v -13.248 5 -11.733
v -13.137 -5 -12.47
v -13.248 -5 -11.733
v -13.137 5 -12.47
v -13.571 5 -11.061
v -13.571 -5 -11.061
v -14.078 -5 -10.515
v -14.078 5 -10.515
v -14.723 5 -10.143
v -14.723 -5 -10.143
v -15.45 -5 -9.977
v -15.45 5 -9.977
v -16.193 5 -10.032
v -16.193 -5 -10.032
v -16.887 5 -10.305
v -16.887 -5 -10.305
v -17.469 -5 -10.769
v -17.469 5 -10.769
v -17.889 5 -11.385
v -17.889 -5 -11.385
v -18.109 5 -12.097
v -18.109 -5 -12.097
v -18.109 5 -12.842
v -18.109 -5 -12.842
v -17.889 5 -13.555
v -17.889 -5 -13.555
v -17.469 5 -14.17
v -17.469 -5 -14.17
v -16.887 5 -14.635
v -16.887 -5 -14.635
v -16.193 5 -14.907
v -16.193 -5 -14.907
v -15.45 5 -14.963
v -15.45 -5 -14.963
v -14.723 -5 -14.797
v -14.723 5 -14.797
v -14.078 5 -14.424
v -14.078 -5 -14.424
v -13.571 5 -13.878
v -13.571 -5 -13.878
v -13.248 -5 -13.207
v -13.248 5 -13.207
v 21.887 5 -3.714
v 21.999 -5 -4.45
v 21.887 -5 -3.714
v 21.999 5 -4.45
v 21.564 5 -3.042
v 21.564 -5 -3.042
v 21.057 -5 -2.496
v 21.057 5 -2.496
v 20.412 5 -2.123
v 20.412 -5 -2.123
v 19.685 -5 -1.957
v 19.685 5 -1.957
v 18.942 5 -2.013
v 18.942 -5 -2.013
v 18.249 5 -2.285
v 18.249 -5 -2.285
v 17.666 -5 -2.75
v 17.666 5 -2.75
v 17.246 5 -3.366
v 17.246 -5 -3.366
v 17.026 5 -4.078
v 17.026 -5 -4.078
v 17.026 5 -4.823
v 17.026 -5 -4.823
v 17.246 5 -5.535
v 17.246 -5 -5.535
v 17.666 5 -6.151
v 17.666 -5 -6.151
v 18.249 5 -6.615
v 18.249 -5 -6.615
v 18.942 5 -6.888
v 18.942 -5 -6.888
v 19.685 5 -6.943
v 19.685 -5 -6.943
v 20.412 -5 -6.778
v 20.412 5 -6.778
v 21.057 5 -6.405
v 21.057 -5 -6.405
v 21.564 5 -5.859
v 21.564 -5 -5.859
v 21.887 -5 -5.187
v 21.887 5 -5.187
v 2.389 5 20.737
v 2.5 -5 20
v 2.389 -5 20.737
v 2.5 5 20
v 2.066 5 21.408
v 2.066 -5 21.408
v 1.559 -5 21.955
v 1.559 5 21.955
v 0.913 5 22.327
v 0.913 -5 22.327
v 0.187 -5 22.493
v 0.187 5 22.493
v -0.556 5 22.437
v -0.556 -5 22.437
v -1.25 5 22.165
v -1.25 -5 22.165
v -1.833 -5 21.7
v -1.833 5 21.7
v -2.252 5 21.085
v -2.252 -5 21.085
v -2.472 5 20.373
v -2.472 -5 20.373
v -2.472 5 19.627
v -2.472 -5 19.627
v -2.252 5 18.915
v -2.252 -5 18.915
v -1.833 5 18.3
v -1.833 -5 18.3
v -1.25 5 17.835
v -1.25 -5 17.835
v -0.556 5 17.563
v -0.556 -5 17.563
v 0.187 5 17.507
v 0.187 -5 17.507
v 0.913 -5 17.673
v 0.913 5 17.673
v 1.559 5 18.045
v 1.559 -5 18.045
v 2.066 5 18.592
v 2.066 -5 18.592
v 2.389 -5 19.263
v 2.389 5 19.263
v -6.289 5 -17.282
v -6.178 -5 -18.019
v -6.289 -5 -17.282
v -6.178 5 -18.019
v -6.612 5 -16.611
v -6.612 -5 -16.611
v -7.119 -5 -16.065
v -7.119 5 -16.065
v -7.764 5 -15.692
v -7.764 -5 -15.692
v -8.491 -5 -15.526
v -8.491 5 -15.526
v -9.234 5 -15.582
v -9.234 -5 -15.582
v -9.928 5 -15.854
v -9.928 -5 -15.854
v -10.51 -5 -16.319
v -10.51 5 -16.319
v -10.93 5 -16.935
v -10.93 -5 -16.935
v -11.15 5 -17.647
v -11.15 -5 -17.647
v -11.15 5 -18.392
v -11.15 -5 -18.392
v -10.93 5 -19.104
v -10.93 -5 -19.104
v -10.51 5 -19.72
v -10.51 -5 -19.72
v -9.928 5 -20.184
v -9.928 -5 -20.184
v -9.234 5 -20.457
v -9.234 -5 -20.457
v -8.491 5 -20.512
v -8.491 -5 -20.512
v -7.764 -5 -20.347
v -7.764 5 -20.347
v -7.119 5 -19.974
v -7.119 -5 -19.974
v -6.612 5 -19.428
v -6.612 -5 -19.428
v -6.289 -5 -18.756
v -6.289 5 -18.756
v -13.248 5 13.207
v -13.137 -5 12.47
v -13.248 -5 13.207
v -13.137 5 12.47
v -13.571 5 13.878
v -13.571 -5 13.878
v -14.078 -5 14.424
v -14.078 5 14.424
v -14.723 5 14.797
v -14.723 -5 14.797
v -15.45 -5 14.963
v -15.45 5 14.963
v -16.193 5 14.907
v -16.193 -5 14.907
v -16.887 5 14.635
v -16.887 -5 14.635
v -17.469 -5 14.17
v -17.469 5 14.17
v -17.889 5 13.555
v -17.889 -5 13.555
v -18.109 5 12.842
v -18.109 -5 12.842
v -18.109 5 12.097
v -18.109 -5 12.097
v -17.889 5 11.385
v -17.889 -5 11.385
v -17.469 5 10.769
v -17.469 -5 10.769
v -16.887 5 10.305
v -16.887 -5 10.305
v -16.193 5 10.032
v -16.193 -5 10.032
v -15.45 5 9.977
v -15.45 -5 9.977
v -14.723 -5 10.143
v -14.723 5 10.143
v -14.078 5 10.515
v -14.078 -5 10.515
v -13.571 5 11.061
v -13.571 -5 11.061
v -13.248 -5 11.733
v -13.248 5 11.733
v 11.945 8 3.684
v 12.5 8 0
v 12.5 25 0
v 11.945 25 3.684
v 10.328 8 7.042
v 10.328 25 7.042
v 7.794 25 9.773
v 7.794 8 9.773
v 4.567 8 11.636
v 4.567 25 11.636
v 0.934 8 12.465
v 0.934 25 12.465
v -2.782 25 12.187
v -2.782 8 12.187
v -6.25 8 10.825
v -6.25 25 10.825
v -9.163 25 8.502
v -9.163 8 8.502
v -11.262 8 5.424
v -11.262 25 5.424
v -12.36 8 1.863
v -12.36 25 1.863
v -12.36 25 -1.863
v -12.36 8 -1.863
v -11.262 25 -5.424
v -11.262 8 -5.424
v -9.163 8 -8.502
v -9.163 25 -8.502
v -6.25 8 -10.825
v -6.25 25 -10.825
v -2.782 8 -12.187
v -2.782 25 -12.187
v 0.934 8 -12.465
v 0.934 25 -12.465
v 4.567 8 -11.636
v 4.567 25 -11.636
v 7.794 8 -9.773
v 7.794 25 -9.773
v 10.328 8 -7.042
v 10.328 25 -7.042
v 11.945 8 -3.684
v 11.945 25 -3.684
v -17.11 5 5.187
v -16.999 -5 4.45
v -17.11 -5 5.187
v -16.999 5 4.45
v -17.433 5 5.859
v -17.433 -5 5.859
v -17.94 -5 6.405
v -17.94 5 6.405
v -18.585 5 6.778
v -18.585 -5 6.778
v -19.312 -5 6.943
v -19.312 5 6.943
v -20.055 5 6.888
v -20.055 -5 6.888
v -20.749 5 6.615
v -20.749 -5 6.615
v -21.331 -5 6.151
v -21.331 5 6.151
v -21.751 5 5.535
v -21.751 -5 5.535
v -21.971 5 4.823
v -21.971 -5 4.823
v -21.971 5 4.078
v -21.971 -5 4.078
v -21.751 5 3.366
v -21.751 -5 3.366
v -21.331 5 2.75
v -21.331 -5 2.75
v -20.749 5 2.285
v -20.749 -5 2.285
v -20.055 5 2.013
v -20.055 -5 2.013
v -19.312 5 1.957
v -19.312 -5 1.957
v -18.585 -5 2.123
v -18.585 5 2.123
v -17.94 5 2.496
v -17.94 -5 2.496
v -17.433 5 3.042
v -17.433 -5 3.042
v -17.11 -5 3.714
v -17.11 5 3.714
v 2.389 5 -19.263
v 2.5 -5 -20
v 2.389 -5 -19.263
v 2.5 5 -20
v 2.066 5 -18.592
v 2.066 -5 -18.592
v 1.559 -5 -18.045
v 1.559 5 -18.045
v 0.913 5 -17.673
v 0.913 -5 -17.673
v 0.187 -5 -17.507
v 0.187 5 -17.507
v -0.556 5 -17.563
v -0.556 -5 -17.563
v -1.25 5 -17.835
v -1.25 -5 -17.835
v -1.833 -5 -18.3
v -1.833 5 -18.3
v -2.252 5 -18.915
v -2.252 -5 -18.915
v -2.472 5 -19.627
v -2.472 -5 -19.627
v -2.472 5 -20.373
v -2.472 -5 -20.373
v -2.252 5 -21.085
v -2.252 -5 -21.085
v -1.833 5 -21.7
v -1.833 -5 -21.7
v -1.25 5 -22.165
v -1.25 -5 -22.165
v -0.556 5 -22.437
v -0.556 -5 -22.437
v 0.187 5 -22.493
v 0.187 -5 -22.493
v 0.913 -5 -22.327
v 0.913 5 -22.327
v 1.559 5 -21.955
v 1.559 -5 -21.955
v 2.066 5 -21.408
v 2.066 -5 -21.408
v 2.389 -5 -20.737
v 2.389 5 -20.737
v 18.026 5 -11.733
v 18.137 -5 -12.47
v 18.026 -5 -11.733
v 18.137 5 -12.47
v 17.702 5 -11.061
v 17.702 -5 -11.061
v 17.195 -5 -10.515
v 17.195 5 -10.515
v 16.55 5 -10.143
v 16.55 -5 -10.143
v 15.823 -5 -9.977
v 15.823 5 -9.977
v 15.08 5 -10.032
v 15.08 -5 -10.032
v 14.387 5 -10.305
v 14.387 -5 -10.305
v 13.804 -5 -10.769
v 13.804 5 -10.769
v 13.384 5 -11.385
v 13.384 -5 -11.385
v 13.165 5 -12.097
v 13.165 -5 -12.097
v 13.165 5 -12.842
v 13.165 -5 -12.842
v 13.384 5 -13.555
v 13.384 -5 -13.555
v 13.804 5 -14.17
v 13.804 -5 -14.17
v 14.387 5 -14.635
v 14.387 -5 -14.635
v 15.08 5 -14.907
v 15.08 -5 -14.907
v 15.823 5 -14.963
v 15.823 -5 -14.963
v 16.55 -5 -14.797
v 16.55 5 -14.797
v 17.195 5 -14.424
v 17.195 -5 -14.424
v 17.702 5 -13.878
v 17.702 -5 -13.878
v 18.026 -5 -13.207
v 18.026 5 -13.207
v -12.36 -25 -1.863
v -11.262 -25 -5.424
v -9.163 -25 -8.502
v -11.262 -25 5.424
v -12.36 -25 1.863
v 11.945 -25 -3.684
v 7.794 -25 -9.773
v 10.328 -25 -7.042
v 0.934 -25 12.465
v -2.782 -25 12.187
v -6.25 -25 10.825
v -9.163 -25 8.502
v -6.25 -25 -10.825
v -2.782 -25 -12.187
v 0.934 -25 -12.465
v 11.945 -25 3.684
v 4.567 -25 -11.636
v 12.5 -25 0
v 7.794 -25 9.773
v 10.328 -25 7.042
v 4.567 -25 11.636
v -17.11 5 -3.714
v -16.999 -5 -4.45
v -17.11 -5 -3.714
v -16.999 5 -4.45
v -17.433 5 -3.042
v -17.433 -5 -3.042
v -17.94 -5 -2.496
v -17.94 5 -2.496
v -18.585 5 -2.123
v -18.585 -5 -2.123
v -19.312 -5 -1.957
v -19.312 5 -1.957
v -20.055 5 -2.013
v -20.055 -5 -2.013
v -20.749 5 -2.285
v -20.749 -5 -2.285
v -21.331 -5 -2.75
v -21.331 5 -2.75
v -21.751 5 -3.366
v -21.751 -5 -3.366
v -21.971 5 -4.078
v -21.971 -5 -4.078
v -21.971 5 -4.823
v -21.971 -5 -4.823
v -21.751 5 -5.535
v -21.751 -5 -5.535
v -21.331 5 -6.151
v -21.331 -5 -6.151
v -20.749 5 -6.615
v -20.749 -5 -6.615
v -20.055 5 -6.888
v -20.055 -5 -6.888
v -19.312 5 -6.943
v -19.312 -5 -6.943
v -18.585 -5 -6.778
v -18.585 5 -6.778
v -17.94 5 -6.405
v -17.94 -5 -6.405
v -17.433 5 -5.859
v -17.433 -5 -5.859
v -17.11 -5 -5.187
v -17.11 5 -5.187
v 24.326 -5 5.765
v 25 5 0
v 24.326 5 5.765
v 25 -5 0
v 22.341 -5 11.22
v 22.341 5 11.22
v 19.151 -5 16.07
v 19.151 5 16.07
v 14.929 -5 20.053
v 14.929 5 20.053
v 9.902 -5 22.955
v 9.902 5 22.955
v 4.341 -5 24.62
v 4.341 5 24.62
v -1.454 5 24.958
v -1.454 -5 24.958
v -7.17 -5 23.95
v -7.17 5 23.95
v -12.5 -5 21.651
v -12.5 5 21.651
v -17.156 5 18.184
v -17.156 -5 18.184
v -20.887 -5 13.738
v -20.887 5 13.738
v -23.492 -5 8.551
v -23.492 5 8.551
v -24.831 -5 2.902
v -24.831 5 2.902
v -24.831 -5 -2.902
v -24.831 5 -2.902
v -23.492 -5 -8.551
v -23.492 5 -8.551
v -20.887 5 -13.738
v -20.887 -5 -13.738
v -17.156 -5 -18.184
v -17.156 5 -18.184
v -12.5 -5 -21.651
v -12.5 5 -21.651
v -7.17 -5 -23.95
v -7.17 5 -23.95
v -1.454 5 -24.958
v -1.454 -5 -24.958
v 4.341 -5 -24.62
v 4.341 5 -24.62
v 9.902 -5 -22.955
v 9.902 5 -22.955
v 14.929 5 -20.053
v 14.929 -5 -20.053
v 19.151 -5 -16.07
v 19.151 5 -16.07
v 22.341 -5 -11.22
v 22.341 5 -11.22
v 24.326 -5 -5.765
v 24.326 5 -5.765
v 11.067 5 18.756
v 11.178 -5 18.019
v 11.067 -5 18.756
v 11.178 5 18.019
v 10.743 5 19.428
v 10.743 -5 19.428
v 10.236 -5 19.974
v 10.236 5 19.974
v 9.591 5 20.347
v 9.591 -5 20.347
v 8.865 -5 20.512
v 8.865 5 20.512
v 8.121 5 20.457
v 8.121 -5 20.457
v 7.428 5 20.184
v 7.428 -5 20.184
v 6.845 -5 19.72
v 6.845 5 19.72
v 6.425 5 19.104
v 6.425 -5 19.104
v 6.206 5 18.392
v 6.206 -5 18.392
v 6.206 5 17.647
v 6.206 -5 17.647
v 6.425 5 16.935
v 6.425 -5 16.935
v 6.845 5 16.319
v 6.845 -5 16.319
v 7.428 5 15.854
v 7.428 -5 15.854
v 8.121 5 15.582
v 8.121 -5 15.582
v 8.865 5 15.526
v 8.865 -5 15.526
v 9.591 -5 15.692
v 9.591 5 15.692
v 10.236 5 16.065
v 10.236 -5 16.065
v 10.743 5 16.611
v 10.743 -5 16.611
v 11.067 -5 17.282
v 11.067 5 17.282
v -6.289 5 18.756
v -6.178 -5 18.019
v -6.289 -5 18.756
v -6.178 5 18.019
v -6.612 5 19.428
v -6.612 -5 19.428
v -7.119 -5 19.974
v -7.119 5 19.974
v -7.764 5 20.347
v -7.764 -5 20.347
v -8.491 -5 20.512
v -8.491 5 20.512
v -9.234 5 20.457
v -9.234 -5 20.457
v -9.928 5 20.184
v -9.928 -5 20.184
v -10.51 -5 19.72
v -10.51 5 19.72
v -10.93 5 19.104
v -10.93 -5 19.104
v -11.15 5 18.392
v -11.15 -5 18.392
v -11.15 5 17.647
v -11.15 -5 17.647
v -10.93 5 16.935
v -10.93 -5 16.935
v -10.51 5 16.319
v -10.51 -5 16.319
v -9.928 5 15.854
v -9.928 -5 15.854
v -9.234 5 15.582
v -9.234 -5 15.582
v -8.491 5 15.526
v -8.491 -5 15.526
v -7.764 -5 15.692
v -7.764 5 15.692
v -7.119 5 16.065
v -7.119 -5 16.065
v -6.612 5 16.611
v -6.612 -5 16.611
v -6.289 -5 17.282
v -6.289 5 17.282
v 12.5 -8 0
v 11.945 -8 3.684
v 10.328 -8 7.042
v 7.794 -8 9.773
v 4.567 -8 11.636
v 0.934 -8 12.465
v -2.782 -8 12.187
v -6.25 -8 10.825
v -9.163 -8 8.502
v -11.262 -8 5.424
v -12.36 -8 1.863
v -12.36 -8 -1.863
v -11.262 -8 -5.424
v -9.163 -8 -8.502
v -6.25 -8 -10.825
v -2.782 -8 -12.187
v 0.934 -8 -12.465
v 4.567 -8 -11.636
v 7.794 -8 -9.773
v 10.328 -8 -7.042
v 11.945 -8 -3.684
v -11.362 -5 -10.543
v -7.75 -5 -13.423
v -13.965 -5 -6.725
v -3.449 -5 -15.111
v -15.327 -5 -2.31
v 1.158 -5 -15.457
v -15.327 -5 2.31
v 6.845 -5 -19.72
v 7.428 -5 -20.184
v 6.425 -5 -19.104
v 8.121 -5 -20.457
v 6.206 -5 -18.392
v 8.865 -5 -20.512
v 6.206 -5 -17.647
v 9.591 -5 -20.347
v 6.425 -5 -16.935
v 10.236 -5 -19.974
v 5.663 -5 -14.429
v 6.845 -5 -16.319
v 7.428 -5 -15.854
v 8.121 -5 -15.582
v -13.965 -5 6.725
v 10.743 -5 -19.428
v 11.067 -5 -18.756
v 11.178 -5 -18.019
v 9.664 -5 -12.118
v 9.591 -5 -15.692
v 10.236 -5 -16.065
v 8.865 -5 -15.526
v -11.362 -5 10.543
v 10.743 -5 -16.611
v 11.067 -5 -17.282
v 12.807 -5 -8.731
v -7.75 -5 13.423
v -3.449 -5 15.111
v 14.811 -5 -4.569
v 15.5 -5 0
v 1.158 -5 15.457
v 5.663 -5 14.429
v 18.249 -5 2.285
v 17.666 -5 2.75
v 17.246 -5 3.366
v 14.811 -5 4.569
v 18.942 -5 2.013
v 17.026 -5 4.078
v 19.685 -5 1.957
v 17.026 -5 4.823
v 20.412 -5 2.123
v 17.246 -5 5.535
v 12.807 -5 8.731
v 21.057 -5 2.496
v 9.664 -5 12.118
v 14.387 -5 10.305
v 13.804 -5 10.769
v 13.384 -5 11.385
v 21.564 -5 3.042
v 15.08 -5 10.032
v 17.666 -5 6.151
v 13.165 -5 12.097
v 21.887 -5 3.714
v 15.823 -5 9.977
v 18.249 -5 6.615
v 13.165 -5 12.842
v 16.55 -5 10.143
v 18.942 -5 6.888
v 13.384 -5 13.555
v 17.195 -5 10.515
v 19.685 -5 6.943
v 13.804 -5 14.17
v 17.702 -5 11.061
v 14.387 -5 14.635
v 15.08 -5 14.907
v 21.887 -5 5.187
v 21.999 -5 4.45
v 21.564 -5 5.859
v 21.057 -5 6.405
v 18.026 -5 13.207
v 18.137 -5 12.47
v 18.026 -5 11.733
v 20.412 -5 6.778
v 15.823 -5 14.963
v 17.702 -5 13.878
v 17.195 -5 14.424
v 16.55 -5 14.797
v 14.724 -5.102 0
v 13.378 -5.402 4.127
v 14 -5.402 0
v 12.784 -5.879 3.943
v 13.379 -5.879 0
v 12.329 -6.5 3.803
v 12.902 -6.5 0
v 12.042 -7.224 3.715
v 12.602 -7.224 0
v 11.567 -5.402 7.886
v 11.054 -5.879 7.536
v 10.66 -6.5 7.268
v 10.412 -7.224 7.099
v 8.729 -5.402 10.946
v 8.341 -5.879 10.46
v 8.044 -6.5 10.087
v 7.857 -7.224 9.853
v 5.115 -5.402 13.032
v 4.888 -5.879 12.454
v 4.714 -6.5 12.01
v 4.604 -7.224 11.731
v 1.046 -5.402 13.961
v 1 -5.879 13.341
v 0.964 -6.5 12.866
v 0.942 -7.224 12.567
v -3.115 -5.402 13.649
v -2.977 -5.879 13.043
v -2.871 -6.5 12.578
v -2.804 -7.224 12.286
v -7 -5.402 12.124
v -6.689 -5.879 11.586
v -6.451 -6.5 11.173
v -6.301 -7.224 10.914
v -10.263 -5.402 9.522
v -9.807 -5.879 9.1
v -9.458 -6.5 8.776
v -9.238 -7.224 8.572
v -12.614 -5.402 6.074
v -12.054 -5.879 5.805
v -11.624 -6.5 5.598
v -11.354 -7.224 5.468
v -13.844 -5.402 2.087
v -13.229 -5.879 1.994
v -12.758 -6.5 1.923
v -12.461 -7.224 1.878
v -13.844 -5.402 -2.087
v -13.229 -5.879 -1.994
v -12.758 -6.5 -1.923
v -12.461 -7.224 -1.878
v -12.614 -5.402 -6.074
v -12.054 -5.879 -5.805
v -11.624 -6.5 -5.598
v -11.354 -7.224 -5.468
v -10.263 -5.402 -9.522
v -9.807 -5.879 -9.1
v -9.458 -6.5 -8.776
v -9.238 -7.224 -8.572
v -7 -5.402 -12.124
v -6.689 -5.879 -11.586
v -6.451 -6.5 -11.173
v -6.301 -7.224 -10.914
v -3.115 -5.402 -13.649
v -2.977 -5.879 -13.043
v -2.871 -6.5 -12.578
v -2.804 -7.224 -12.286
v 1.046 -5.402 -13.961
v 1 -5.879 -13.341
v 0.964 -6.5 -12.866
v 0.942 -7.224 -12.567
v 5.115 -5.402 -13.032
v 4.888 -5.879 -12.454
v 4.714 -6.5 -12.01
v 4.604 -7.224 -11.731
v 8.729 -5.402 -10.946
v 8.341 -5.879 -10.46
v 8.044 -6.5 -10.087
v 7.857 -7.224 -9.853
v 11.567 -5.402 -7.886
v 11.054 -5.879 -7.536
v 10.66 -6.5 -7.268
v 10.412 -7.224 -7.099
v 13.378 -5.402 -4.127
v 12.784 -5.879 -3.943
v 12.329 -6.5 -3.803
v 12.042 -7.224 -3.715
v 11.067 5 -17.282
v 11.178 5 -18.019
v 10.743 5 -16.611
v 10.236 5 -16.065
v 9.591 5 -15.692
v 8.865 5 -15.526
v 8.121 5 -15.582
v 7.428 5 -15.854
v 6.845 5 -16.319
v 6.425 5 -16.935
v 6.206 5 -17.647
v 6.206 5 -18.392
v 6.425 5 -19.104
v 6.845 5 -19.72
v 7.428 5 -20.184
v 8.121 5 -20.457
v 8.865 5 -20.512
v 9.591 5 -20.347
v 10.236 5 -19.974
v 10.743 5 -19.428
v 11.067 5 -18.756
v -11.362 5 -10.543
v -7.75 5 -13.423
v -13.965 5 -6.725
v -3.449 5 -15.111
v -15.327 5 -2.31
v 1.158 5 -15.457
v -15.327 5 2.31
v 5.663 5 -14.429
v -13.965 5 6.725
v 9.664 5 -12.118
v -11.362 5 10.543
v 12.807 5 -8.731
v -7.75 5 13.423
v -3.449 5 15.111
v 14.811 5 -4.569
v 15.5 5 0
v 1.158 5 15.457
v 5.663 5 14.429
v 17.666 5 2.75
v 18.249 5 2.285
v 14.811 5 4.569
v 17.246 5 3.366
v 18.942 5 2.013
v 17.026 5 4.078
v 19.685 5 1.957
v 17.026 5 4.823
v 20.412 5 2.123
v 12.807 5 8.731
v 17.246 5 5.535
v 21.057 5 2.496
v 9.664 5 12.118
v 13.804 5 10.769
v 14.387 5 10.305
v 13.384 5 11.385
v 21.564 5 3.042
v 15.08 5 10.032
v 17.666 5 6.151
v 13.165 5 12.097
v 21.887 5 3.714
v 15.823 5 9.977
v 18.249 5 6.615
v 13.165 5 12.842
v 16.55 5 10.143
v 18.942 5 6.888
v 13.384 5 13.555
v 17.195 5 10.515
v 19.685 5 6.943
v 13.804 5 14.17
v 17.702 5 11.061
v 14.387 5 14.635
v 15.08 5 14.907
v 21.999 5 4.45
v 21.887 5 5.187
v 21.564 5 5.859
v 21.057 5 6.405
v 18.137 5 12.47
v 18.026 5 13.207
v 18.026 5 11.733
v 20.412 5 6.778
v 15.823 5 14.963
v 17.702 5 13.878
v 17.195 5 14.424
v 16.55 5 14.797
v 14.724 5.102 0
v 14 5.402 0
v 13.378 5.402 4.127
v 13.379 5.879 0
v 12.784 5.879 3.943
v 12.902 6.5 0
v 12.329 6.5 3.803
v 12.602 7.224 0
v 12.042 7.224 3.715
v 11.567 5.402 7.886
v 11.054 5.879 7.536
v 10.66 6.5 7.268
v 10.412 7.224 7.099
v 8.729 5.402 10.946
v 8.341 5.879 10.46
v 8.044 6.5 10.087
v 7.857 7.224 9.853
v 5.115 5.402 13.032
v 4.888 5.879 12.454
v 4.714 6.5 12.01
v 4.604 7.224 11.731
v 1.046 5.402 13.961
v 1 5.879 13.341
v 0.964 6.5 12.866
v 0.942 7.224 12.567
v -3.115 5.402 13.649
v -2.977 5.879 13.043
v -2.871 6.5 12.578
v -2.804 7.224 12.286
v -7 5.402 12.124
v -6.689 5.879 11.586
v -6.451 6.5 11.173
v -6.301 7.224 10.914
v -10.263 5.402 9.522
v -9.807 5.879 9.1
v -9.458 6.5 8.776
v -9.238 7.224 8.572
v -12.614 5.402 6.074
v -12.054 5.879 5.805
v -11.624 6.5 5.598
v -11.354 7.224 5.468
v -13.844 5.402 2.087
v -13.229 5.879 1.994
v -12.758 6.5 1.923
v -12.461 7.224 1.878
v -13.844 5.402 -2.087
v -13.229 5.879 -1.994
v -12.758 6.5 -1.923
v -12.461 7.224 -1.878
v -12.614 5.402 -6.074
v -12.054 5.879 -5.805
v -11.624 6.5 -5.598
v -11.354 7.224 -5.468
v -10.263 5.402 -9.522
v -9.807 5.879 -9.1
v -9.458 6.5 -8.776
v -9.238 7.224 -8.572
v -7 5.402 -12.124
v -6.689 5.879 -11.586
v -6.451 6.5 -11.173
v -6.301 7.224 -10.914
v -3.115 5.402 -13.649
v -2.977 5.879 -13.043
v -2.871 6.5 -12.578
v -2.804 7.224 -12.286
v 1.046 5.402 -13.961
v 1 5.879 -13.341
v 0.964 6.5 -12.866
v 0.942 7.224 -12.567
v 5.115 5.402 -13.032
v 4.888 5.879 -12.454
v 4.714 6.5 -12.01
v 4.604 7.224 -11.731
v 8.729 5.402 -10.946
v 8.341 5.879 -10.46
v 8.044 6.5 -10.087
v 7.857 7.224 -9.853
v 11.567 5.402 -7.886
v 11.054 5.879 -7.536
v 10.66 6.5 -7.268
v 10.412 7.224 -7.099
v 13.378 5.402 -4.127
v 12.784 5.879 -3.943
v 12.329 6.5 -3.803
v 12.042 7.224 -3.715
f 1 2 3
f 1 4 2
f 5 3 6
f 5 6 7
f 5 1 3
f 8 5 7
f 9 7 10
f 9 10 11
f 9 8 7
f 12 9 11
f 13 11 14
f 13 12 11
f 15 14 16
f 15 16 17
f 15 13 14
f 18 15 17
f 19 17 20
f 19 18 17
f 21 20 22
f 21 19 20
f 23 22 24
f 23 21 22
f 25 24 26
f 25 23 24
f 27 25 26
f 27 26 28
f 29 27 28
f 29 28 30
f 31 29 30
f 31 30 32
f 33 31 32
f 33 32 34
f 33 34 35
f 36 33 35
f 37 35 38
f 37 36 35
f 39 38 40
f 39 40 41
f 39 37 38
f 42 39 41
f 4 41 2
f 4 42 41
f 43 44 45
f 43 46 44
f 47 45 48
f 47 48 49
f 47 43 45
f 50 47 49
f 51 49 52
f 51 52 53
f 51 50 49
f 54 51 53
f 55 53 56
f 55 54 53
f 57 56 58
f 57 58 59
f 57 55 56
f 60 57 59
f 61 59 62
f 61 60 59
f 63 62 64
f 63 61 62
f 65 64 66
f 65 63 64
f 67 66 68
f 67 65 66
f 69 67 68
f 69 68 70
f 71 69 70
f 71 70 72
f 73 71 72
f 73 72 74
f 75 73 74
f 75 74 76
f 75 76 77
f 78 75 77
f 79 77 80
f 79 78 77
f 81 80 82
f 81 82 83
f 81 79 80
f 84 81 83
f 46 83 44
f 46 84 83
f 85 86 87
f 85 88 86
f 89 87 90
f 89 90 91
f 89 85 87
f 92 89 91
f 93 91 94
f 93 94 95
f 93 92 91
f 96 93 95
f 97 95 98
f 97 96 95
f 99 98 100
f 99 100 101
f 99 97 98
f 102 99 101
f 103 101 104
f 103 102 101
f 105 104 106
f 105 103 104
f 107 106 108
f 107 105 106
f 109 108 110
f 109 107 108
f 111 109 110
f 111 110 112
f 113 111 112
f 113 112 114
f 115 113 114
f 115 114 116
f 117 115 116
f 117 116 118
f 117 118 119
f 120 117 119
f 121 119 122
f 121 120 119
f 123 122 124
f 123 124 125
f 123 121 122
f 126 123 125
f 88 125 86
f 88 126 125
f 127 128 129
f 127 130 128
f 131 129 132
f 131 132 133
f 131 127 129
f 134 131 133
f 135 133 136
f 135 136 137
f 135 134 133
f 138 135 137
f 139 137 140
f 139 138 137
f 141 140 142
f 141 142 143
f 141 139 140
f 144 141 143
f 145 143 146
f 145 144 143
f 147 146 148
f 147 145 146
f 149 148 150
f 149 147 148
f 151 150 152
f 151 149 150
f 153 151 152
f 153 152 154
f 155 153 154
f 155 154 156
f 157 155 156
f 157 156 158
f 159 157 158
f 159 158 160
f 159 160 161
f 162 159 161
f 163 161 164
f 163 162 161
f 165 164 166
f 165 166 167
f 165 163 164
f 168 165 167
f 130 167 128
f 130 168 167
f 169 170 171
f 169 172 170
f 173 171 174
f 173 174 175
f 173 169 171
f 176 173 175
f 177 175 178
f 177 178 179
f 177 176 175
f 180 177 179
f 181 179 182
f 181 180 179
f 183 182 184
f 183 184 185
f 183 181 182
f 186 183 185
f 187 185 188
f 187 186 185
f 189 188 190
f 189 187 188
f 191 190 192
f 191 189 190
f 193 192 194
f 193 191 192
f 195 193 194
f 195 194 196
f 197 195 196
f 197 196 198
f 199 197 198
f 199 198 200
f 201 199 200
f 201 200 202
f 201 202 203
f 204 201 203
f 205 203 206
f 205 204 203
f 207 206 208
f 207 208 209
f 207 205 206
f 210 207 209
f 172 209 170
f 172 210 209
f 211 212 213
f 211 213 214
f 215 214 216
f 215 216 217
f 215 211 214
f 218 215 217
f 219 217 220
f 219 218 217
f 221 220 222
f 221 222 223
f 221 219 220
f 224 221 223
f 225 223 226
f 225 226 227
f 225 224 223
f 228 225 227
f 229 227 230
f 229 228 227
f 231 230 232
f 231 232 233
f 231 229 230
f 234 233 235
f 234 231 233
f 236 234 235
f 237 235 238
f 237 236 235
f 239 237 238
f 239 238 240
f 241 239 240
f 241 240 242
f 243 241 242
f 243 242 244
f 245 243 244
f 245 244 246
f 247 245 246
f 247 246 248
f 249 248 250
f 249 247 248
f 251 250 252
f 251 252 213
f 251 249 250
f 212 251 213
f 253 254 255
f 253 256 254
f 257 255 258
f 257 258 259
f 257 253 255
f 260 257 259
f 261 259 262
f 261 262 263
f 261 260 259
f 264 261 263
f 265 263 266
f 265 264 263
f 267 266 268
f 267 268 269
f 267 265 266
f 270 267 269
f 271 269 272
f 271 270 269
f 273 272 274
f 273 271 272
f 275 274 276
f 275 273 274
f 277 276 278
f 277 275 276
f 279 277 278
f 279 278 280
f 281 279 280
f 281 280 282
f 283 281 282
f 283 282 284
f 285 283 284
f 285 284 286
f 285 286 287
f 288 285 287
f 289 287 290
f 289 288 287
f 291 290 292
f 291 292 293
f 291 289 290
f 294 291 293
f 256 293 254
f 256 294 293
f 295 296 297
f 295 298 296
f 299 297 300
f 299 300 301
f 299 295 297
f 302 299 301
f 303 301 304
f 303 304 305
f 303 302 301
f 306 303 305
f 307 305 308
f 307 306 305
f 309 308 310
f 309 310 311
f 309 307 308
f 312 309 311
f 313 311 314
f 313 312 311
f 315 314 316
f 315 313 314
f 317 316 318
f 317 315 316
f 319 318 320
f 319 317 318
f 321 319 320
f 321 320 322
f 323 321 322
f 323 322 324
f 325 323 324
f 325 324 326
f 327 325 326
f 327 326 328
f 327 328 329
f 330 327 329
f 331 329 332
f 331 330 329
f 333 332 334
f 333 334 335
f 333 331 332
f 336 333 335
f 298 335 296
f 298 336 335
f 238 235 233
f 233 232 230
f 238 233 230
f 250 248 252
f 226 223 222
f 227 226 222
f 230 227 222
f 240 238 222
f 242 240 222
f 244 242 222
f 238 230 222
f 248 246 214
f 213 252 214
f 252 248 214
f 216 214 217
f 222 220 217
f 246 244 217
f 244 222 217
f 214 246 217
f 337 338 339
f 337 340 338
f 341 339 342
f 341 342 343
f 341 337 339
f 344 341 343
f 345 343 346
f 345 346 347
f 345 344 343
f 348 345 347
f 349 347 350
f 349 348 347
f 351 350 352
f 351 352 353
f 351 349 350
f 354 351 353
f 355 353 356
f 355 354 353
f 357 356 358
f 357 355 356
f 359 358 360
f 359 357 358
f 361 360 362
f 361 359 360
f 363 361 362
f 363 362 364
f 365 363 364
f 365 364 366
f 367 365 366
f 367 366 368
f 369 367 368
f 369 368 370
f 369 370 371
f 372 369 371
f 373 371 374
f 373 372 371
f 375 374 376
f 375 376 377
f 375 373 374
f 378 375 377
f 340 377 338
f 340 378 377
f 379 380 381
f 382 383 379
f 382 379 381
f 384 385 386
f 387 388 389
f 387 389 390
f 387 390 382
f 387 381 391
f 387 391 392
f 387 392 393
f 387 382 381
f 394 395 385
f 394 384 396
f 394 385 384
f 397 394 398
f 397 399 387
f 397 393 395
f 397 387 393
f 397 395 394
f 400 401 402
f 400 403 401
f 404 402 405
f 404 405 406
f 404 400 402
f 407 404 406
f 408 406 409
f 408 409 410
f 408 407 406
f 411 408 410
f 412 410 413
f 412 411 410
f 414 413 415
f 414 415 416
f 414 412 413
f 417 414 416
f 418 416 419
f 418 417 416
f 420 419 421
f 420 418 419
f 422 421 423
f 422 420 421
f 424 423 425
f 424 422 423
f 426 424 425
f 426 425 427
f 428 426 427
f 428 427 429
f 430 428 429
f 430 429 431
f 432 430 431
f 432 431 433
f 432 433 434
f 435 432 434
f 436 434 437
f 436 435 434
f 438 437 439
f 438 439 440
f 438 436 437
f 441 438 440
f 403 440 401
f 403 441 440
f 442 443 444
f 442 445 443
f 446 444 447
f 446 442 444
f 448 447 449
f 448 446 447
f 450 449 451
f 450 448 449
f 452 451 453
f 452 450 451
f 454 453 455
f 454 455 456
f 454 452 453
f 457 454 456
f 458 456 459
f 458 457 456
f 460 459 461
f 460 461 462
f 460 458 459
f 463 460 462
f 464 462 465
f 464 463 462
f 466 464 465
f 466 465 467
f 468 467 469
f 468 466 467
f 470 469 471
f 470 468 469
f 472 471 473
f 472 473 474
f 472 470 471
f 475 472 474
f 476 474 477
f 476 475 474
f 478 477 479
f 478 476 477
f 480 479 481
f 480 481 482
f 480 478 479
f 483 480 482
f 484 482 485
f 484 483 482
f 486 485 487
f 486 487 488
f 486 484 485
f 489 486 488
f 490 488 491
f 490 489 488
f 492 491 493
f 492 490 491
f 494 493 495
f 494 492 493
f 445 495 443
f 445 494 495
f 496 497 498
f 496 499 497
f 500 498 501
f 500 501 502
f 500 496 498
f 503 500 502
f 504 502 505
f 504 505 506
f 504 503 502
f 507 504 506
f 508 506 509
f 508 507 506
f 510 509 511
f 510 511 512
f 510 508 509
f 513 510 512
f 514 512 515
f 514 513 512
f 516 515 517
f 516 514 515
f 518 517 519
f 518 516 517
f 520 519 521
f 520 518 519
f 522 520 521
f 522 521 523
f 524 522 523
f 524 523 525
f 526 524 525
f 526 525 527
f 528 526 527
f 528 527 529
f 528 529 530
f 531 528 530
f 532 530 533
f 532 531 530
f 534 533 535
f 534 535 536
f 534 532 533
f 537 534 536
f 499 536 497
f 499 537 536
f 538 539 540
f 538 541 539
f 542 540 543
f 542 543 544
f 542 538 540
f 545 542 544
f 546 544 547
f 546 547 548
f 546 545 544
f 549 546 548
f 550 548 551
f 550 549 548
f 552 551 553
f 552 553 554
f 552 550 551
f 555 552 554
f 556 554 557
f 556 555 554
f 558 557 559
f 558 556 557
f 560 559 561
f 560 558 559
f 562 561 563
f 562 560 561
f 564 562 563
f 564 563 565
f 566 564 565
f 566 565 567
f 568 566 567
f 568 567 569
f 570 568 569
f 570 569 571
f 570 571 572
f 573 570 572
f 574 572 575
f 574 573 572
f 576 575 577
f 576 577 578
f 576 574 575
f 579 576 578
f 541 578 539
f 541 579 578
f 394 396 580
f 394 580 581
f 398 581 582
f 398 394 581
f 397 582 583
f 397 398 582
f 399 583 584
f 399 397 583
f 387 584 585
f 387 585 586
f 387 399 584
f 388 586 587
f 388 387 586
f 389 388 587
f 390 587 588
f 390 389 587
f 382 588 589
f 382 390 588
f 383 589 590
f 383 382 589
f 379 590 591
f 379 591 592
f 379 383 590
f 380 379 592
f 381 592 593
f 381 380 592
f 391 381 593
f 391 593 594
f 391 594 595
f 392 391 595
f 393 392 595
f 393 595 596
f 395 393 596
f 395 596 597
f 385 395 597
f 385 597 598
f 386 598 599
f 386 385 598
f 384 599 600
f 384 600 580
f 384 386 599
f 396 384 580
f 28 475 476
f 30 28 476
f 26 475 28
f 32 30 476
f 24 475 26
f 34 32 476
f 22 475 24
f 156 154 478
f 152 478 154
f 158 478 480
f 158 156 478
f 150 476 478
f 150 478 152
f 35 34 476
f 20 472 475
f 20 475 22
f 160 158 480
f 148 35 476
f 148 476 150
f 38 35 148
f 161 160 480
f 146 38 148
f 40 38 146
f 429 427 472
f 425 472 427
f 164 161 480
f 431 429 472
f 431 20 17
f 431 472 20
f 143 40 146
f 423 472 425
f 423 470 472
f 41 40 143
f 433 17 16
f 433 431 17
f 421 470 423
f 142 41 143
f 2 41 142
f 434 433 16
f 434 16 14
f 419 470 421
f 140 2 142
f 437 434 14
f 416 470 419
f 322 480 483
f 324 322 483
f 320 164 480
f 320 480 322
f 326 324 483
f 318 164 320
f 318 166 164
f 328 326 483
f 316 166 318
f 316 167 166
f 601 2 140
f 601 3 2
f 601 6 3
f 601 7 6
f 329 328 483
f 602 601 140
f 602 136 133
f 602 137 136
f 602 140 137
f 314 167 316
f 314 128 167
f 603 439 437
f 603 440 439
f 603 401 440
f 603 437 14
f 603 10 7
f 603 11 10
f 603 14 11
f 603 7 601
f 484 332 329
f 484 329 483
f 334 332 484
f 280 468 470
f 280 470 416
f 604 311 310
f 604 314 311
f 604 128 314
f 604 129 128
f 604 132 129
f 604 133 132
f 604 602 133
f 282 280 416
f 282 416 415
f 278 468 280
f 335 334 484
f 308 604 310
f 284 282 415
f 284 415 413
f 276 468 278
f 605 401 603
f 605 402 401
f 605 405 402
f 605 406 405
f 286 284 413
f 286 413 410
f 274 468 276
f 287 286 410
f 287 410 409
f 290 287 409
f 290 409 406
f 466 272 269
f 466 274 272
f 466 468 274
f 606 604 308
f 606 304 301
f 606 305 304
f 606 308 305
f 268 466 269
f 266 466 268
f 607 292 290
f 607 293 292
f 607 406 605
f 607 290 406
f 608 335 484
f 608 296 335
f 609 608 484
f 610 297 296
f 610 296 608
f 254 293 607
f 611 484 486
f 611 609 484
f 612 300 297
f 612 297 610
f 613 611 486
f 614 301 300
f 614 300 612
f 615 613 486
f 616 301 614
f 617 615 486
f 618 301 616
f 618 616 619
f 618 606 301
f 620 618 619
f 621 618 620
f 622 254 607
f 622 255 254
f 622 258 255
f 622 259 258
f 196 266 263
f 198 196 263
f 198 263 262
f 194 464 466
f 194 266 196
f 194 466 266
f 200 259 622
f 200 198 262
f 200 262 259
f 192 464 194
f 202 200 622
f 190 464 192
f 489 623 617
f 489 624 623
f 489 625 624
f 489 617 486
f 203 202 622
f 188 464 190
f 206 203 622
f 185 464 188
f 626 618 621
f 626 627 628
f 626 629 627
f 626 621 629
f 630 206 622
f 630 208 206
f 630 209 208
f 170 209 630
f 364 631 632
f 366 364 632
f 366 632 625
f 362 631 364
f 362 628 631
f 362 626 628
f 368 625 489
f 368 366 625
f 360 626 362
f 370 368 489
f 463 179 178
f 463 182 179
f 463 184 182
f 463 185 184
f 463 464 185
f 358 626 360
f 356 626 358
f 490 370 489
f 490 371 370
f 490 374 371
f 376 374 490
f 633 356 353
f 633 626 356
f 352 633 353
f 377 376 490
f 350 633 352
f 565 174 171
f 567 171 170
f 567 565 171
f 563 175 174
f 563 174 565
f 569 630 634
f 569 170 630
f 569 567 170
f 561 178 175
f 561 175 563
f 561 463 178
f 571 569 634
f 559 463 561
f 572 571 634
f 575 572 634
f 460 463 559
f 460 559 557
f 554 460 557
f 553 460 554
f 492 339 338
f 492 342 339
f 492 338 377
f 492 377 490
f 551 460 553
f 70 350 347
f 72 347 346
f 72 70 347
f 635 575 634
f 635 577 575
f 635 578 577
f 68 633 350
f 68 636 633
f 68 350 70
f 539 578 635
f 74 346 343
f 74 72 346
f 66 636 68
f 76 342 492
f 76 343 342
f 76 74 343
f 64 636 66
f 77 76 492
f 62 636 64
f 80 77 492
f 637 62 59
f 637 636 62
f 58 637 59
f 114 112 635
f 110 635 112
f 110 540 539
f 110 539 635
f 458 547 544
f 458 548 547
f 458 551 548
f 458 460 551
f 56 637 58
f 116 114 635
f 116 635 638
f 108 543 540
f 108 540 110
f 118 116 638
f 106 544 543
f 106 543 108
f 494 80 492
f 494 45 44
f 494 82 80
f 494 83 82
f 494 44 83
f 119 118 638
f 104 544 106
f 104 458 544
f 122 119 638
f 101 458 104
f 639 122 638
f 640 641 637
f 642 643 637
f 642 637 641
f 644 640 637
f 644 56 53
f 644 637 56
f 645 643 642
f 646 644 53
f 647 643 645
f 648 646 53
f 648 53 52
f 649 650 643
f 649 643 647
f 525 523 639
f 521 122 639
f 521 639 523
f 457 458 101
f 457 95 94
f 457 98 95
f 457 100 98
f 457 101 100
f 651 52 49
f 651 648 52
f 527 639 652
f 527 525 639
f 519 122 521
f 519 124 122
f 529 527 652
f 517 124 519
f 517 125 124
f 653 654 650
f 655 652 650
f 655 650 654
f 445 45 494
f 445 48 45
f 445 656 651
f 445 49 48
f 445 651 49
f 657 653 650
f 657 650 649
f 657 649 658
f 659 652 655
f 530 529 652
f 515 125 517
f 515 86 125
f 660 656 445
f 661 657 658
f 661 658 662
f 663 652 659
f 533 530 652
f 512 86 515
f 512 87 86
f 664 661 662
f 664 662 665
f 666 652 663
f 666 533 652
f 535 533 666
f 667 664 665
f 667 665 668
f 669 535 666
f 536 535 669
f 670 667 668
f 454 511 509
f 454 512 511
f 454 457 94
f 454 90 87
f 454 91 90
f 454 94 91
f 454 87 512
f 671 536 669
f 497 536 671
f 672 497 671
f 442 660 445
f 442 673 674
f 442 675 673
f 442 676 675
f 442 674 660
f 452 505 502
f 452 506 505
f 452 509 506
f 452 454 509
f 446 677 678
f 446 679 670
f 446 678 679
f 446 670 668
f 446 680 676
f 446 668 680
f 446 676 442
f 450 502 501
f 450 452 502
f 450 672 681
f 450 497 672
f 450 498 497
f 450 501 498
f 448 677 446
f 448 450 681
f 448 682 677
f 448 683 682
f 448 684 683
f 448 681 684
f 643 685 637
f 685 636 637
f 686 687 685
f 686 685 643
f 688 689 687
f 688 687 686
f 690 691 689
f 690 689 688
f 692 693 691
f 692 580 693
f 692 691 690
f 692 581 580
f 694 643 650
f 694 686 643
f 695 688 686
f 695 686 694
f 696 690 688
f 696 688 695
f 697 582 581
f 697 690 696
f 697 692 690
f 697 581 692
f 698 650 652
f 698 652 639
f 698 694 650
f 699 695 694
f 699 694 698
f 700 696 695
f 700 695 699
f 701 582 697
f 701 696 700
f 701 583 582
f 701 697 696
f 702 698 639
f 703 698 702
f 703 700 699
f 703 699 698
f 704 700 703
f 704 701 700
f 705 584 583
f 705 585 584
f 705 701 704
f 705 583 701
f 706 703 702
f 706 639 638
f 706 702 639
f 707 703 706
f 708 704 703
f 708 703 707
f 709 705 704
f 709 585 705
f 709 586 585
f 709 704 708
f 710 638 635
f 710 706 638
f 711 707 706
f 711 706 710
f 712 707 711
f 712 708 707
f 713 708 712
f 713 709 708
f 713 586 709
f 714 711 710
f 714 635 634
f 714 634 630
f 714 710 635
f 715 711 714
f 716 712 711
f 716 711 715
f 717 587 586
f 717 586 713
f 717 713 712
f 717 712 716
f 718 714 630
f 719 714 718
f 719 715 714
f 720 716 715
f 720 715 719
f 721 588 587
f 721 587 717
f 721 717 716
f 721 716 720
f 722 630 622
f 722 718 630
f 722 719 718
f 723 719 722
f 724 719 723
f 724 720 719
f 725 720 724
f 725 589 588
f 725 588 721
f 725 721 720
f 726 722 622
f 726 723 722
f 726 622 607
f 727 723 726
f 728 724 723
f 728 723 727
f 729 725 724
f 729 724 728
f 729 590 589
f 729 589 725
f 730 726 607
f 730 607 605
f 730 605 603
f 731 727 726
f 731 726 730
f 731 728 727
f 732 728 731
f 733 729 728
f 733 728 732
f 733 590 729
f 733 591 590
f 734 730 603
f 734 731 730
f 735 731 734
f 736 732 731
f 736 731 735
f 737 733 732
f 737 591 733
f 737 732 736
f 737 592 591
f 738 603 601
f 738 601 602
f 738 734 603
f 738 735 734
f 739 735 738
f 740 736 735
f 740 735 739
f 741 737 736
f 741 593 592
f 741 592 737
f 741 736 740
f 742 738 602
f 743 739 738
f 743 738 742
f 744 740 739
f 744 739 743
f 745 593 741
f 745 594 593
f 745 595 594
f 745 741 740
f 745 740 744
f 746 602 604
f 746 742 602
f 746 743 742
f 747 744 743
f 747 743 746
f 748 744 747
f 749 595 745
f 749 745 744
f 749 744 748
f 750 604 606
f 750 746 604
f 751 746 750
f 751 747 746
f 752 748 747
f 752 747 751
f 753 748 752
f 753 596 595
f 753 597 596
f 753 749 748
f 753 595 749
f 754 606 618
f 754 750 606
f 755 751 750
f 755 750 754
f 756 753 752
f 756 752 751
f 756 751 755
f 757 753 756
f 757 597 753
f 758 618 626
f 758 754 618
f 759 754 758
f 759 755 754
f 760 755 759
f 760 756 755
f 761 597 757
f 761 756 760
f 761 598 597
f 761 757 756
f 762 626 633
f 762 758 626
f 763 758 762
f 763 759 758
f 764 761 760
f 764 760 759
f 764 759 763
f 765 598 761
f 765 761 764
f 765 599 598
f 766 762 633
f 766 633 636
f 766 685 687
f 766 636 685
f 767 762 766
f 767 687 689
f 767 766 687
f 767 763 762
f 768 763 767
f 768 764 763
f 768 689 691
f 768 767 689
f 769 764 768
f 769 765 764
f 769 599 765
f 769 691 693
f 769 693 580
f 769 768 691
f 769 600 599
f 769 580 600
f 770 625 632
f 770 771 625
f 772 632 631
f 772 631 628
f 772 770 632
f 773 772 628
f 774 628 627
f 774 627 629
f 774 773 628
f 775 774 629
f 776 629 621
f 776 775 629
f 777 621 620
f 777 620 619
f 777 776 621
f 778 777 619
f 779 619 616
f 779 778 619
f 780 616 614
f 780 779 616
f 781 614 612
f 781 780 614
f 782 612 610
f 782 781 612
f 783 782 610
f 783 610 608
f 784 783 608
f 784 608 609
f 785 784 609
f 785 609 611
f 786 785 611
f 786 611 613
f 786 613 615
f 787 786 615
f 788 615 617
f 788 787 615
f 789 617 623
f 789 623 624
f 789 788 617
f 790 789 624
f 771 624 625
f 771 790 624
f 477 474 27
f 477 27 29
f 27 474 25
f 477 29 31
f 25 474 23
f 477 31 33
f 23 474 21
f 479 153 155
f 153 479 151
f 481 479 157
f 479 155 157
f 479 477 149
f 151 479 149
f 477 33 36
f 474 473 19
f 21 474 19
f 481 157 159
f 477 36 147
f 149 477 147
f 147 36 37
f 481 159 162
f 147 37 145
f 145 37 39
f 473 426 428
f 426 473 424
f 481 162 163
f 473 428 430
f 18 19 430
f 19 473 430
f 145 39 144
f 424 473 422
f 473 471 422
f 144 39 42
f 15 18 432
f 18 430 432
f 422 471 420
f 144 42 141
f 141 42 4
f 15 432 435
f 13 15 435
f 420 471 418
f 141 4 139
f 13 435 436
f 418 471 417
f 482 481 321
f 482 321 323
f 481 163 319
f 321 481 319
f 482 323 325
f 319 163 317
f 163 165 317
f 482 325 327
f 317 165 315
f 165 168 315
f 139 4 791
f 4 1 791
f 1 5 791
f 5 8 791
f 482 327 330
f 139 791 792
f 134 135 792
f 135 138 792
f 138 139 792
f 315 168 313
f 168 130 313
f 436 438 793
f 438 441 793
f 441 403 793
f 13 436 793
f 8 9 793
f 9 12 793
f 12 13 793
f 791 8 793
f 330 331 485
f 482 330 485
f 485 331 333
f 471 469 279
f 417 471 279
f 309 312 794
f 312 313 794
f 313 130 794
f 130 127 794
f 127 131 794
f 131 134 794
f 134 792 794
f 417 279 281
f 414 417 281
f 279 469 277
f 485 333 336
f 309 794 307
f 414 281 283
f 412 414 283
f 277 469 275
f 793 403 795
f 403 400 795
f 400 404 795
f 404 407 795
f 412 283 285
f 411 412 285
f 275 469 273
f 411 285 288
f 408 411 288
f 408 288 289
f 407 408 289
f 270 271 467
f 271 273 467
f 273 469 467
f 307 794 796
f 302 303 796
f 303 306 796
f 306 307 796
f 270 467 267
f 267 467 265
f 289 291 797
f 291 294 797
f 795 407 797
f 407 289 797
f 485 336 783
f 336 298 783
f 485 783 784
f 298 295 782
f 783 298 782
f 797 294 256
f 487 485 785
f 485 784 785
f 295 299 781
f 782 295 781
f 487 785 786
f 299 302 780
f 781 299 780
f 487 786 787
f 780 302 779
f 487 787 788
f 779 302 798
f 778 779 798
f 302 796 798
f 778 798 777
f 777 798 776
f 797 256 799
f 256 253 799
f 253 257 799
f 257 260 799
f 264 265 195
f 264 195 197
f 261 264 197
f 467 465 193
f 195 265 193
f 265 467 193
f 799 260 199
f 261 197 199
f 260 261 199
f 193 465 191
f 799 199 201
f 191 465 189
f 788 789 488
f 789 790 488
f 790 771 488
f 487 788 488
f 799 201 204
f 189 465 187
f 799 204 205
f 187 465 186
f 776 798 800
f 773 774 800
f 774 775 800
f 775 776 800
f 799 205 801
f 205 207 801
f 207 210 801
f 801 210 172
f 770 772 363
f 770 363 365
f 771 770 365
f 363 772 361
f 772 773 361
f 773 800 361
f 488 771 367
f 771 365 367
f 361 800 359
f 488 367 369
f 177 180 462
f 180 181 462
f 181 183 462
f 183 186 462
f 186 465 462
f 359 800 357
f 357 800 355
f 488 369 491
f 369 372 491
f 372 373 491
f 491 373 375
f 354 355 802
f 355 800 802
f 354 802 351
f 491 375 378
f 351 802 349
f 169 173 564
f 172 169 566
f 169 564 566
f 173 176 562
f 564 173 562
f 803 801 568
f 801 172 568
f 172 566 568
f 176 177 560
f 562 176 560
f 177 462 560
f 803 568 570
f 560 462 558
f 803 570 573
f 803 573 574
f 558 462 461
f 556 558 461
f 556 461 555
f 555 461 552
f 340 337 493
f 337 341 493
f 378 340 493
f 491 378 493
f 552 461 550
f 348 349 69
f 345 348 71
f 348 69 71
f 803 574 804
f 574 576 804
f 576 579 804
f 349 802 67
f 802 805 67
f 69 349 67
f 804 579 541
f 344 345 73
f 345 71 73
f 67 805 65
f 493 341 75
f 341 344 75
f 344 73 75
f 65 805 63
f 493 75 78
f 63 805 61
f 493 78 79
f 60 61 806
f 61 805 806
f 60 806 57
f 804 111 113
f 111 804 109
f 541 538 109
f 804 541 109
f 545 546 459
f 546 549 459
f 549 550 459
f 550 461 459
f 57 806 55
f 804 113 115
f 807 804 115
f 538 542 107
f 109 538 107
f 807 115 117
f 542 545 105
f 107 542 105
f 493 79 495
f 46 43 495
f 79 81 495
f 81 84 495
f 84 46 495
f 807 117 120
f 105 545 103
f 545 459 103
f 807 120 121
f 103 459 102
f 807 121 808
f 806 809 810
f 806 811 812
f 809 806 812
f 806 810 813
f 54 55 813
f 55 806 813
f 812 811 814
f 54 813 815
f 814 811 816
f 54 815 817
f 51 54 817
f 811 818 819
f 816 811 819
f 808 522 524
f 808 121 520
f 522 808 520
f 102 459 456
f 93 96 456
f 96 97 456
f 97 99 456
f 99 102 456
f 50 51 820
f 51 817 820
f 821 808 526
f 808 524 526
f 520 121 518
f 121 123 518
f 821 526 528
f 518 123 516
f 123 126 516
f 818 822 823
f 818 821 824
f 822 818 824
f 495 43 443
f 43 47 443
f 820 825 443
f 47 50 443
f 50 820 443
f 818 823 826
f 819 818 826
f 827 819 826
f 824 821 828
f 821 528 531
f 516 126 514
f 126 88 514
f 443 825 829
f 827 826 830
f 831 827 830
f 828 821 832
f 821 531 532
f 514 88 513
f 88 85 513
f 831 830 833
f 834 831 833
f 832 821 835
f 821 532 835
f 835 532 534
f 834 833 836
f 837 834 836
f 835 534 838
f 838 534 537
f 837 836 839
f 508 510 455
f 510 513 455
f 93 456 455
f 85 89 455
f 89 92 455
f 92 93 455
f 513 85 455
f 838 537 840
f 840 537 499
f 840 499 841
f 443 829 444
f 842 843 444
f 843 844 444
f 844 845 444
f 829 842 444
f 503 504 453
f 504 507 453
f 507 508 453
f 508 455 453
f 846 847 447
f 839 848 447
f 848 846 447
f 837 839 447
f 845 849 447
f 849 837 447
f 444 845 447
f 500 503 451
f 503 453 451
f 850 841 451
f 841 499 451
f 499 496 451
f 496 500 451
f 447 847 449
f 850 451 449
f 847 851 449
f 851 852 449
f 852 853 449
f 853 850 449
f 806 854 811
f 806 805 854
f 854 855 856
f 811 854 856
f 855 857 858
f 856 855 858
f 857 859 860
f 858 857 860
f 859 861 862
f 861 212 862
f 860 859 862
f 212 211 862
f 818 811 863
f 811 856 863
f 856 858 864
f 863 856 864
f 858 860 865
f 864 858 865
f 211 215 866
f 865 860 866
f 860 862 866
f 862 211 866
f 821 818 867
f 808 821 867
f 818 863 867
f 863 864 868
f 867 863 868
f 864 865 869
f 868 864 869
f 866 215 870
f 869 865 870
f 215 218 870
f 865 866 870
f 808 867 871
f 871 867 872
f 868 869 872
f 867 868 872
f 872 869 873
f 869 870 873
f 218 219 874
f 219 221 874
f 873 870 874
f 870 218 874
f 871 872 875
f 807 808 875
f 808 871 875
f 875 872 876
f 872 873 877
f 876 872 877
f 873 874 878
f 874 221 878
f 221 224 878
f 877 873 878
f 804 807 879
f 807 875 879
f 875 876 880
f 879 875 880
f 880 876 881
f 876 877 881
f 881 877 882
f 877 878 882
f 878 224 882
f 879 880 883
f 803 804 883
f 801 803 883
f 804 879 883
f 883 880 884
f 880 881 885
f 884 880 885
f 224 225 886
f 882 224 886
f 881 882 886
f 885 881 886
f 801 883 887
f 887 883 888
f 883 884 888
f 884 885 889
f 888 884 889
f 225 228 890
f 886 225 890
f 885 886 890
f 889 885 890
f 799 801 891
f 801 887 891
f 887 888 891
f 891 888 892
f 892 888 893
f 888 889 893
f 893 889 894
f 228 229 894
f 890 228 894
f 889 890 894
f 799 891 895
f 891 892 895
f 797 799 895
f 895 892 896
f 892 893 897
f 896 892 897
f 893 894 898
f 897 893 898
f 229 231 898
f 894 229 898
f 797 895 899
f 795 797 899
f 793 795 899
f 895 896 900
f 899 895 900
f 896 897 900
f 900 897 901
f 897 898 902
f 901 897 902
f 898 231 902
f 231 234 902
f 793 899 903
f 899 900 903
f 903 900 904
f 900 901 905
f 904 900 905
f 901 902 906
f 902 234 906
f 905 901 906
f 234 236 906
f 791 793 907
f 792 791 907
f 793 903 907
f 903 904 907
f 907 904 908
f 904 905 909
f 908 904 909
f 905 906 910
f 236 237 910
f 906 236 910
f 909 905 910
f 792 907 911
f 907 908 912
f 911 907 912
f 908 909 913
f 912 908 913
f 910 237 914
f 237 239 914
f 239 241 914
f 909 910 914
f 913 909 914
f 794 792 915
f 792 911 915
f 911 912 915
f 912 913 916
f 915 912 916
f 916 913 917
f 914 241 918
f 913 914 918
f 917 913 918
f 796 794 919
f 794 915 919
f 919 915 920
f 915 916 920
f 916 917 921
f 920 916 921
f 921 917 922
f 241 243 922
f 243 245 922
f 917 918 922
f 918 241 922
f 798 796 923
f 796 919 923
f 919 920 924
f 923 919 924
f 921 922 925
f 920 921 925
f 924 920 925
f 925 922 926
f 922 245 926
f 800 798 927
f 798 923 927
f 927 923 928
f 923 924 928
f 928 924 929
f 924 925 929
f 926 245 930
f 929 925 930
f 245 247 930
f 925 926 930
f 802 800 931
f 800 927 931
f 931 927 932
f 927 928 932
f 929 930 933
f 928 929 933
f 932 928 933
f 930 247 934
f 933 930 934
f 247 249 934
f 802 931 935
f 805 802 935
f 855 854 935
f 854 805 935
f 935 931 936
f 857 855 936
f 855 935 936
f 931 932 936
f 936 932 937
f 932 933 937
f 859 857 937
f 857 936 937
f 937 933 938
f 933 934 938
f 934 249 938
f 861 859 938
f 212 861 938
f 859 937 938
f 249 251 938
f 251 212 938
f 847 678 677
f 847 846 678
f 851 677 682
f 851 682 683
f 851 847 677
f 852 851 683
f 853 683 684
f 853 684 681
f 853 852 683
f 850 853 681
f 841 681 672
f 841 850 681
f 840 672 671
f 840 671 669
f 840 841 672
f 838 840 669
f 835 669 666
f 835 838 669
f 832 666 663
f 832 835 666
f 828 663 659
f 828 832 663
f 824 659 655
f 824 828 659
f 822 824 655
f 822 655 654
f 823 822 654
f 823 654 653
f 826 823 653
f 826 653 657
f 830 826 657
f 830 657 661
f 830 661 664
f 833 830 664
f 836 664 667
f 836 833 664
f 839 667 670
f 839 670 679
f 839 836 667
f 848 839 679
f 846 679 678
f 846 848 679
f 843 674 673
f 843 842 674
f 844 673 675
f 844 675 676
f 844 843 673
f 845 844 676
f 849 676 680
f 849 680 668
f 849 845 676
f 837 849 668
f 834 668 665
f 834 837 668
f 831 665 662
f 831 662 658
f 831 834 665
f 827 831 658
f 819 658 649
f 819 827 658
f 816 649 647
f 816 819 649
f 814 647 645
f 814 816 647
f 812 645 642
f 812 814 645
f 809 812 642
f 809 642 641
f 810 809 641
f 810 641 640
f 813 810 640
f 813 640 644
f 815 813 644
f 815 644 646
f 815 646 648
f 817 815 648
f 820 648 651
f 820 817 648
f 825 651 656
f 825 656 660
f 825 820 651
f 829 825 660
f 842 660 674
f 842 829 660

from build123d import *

# Parameters (mm, degrees)
F0_R     = 12.5
F1_DEPTH = 25
F2_R     = 25
F2_R_2   = 2.5
F3_DEPTH = 5
F4_R     = 3


with BuildPart() as f1:
    # F0 (on Front) → F1 (new body, symmetric)
    with BuildSketch(Plane.XZ):
        Circle(F0_R)
    extrude(amount=F1_DEPTH, both=True)

    # F2 (on Front) → F3 (join, symmetric)
    with BuildSketch(Plane.XZ):
        Circle(F2_R)
        with Locations((-8.6776747824, -18.019377358)):
            Circle(F2_R_2, mode=Mode.SUBTRACT)
        with Locations((-15.6366296494, -12.4697960372)):
            Circle(F2_R_2, mode=Mode.SUBTRACT)
        with Locations((-19.4985582436, -4.4504186791)):
            Circle(F2_R_2, mode=Mode.SUBTRACT)
        with Locations((0, -20)):
            Circle(F2_R_2, mode=Mode.SUBTRACT)
        with Locations((8.6776747824, -18.019377358)):
            Circle(F2_R_2, mode=Mode.SUBTRACT)
        with Locations((15.6366296494, -12.4697960372)):
            Circle(F2_R_2, mode=Mode.SUBTRACT)
        with Locations((19.4985582436, -4.4504186791)):
            Circle(F2_R_2, mode=Mode.SUBTRACT)
        with Locations((-19.4985582436, 4.4504186791)):
            Circle(F2_R_2, mode=Mode.SUBTRACT)
        with Locations((-15.6366296494, 12.4697960372)):
            Circle(F2_R_2, mode=Mode.SUBTRACT)
        with Locations((-8.6776747824, 18.019377358)):
            Circle(F2_R_2, mode=Mode.SUBTRACT)
        with Locations((19.4985582436, 4.4504186791)):
            Circle(F2_R_2, mode=Mode.SUBTRACT)
        with Locations((15.6366296494, 12.4697960372)):
            Circle(F2_R_2, mode=Mode.SUBTRACT)
        with Locations((8.6776747824, 18.019377358)):
            Circle(F2_R_2, mode=Mode.SUBTRACT)
        with Locations((0, 20)):
            Circle(F2_R_2, mode=Mode.SUBTRACT)
    extrude(amount=F3_DEPTH, both=True)

    # F4
    f4_edges = [f1.edges().sort_by_distance(p)[0] for p in [
        (-12.5, 5, 0),
        (-12.5, -5, 0),
    ]]
    fillet(f4_edges, radius=F4_R)


solid = f1.part
